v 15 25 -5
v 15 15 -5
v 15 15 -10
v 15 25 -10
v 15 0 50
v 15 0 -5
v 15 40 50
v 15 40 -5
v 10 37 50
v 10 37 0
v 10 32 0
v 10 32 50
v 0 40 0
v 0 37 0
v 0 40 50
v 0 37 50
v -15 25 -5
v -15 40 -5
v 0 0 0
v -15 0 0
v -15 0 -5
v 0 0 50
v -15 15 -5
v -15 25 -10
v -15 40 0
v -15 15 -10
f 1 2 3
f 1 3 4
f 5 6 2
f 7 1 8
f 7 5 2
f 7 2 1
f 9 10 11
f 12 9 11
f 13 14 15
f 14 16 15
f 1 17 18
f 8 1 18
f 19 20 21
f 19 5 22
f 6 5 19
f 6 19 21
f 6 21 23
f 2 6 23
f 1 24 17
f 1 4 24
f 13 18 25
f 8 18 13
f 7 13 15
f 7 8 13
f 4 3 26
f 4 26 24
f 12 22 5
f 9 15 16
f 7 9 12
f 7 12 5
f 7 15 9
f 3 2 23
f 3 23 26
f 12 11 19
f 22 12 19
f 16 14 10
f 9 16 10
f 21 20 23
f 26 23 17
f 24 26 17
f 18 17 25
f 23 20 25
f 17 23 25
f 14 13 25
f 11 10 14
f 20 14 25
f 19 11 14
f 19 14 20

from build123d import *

# Parameters (mm, degrees)
F1_DEPTH = 50
F3_DEPTH = 15
F4_DEPTH = 15


with BuildPart() as f1:
    # F0 (on Top) → F1 (new body)
    with BuildSketch(Plane.XY):
        Polygon((0, 40), (0, 37), (10, 37), (10, 32), (0, 0), (15, 0), (15, 40), align=None)
    extrude(amount=F1_DEPTH)

    # F2 (on Right) → F3 (join)
    with BuildSketch(Plane.YZ):
        Polygon((40, -5), (40, 0), (0, 0), (0, -5), (15, -5), (15, -10), (25, -10), (25, -5), align=None)
    extrude(amount=F3_DEPTH)

    # F2 (on Right) → F4 (join)
    with BuildSketch(Plane.YZ):
        Polygon((40, -5), (40, 0), (0, 0), (0, -5), (15, -5), (15, -10), (25, -10), (25, -5), align=None)
    extrude(amount=-F4_DEPTH)


solid = f1.part
